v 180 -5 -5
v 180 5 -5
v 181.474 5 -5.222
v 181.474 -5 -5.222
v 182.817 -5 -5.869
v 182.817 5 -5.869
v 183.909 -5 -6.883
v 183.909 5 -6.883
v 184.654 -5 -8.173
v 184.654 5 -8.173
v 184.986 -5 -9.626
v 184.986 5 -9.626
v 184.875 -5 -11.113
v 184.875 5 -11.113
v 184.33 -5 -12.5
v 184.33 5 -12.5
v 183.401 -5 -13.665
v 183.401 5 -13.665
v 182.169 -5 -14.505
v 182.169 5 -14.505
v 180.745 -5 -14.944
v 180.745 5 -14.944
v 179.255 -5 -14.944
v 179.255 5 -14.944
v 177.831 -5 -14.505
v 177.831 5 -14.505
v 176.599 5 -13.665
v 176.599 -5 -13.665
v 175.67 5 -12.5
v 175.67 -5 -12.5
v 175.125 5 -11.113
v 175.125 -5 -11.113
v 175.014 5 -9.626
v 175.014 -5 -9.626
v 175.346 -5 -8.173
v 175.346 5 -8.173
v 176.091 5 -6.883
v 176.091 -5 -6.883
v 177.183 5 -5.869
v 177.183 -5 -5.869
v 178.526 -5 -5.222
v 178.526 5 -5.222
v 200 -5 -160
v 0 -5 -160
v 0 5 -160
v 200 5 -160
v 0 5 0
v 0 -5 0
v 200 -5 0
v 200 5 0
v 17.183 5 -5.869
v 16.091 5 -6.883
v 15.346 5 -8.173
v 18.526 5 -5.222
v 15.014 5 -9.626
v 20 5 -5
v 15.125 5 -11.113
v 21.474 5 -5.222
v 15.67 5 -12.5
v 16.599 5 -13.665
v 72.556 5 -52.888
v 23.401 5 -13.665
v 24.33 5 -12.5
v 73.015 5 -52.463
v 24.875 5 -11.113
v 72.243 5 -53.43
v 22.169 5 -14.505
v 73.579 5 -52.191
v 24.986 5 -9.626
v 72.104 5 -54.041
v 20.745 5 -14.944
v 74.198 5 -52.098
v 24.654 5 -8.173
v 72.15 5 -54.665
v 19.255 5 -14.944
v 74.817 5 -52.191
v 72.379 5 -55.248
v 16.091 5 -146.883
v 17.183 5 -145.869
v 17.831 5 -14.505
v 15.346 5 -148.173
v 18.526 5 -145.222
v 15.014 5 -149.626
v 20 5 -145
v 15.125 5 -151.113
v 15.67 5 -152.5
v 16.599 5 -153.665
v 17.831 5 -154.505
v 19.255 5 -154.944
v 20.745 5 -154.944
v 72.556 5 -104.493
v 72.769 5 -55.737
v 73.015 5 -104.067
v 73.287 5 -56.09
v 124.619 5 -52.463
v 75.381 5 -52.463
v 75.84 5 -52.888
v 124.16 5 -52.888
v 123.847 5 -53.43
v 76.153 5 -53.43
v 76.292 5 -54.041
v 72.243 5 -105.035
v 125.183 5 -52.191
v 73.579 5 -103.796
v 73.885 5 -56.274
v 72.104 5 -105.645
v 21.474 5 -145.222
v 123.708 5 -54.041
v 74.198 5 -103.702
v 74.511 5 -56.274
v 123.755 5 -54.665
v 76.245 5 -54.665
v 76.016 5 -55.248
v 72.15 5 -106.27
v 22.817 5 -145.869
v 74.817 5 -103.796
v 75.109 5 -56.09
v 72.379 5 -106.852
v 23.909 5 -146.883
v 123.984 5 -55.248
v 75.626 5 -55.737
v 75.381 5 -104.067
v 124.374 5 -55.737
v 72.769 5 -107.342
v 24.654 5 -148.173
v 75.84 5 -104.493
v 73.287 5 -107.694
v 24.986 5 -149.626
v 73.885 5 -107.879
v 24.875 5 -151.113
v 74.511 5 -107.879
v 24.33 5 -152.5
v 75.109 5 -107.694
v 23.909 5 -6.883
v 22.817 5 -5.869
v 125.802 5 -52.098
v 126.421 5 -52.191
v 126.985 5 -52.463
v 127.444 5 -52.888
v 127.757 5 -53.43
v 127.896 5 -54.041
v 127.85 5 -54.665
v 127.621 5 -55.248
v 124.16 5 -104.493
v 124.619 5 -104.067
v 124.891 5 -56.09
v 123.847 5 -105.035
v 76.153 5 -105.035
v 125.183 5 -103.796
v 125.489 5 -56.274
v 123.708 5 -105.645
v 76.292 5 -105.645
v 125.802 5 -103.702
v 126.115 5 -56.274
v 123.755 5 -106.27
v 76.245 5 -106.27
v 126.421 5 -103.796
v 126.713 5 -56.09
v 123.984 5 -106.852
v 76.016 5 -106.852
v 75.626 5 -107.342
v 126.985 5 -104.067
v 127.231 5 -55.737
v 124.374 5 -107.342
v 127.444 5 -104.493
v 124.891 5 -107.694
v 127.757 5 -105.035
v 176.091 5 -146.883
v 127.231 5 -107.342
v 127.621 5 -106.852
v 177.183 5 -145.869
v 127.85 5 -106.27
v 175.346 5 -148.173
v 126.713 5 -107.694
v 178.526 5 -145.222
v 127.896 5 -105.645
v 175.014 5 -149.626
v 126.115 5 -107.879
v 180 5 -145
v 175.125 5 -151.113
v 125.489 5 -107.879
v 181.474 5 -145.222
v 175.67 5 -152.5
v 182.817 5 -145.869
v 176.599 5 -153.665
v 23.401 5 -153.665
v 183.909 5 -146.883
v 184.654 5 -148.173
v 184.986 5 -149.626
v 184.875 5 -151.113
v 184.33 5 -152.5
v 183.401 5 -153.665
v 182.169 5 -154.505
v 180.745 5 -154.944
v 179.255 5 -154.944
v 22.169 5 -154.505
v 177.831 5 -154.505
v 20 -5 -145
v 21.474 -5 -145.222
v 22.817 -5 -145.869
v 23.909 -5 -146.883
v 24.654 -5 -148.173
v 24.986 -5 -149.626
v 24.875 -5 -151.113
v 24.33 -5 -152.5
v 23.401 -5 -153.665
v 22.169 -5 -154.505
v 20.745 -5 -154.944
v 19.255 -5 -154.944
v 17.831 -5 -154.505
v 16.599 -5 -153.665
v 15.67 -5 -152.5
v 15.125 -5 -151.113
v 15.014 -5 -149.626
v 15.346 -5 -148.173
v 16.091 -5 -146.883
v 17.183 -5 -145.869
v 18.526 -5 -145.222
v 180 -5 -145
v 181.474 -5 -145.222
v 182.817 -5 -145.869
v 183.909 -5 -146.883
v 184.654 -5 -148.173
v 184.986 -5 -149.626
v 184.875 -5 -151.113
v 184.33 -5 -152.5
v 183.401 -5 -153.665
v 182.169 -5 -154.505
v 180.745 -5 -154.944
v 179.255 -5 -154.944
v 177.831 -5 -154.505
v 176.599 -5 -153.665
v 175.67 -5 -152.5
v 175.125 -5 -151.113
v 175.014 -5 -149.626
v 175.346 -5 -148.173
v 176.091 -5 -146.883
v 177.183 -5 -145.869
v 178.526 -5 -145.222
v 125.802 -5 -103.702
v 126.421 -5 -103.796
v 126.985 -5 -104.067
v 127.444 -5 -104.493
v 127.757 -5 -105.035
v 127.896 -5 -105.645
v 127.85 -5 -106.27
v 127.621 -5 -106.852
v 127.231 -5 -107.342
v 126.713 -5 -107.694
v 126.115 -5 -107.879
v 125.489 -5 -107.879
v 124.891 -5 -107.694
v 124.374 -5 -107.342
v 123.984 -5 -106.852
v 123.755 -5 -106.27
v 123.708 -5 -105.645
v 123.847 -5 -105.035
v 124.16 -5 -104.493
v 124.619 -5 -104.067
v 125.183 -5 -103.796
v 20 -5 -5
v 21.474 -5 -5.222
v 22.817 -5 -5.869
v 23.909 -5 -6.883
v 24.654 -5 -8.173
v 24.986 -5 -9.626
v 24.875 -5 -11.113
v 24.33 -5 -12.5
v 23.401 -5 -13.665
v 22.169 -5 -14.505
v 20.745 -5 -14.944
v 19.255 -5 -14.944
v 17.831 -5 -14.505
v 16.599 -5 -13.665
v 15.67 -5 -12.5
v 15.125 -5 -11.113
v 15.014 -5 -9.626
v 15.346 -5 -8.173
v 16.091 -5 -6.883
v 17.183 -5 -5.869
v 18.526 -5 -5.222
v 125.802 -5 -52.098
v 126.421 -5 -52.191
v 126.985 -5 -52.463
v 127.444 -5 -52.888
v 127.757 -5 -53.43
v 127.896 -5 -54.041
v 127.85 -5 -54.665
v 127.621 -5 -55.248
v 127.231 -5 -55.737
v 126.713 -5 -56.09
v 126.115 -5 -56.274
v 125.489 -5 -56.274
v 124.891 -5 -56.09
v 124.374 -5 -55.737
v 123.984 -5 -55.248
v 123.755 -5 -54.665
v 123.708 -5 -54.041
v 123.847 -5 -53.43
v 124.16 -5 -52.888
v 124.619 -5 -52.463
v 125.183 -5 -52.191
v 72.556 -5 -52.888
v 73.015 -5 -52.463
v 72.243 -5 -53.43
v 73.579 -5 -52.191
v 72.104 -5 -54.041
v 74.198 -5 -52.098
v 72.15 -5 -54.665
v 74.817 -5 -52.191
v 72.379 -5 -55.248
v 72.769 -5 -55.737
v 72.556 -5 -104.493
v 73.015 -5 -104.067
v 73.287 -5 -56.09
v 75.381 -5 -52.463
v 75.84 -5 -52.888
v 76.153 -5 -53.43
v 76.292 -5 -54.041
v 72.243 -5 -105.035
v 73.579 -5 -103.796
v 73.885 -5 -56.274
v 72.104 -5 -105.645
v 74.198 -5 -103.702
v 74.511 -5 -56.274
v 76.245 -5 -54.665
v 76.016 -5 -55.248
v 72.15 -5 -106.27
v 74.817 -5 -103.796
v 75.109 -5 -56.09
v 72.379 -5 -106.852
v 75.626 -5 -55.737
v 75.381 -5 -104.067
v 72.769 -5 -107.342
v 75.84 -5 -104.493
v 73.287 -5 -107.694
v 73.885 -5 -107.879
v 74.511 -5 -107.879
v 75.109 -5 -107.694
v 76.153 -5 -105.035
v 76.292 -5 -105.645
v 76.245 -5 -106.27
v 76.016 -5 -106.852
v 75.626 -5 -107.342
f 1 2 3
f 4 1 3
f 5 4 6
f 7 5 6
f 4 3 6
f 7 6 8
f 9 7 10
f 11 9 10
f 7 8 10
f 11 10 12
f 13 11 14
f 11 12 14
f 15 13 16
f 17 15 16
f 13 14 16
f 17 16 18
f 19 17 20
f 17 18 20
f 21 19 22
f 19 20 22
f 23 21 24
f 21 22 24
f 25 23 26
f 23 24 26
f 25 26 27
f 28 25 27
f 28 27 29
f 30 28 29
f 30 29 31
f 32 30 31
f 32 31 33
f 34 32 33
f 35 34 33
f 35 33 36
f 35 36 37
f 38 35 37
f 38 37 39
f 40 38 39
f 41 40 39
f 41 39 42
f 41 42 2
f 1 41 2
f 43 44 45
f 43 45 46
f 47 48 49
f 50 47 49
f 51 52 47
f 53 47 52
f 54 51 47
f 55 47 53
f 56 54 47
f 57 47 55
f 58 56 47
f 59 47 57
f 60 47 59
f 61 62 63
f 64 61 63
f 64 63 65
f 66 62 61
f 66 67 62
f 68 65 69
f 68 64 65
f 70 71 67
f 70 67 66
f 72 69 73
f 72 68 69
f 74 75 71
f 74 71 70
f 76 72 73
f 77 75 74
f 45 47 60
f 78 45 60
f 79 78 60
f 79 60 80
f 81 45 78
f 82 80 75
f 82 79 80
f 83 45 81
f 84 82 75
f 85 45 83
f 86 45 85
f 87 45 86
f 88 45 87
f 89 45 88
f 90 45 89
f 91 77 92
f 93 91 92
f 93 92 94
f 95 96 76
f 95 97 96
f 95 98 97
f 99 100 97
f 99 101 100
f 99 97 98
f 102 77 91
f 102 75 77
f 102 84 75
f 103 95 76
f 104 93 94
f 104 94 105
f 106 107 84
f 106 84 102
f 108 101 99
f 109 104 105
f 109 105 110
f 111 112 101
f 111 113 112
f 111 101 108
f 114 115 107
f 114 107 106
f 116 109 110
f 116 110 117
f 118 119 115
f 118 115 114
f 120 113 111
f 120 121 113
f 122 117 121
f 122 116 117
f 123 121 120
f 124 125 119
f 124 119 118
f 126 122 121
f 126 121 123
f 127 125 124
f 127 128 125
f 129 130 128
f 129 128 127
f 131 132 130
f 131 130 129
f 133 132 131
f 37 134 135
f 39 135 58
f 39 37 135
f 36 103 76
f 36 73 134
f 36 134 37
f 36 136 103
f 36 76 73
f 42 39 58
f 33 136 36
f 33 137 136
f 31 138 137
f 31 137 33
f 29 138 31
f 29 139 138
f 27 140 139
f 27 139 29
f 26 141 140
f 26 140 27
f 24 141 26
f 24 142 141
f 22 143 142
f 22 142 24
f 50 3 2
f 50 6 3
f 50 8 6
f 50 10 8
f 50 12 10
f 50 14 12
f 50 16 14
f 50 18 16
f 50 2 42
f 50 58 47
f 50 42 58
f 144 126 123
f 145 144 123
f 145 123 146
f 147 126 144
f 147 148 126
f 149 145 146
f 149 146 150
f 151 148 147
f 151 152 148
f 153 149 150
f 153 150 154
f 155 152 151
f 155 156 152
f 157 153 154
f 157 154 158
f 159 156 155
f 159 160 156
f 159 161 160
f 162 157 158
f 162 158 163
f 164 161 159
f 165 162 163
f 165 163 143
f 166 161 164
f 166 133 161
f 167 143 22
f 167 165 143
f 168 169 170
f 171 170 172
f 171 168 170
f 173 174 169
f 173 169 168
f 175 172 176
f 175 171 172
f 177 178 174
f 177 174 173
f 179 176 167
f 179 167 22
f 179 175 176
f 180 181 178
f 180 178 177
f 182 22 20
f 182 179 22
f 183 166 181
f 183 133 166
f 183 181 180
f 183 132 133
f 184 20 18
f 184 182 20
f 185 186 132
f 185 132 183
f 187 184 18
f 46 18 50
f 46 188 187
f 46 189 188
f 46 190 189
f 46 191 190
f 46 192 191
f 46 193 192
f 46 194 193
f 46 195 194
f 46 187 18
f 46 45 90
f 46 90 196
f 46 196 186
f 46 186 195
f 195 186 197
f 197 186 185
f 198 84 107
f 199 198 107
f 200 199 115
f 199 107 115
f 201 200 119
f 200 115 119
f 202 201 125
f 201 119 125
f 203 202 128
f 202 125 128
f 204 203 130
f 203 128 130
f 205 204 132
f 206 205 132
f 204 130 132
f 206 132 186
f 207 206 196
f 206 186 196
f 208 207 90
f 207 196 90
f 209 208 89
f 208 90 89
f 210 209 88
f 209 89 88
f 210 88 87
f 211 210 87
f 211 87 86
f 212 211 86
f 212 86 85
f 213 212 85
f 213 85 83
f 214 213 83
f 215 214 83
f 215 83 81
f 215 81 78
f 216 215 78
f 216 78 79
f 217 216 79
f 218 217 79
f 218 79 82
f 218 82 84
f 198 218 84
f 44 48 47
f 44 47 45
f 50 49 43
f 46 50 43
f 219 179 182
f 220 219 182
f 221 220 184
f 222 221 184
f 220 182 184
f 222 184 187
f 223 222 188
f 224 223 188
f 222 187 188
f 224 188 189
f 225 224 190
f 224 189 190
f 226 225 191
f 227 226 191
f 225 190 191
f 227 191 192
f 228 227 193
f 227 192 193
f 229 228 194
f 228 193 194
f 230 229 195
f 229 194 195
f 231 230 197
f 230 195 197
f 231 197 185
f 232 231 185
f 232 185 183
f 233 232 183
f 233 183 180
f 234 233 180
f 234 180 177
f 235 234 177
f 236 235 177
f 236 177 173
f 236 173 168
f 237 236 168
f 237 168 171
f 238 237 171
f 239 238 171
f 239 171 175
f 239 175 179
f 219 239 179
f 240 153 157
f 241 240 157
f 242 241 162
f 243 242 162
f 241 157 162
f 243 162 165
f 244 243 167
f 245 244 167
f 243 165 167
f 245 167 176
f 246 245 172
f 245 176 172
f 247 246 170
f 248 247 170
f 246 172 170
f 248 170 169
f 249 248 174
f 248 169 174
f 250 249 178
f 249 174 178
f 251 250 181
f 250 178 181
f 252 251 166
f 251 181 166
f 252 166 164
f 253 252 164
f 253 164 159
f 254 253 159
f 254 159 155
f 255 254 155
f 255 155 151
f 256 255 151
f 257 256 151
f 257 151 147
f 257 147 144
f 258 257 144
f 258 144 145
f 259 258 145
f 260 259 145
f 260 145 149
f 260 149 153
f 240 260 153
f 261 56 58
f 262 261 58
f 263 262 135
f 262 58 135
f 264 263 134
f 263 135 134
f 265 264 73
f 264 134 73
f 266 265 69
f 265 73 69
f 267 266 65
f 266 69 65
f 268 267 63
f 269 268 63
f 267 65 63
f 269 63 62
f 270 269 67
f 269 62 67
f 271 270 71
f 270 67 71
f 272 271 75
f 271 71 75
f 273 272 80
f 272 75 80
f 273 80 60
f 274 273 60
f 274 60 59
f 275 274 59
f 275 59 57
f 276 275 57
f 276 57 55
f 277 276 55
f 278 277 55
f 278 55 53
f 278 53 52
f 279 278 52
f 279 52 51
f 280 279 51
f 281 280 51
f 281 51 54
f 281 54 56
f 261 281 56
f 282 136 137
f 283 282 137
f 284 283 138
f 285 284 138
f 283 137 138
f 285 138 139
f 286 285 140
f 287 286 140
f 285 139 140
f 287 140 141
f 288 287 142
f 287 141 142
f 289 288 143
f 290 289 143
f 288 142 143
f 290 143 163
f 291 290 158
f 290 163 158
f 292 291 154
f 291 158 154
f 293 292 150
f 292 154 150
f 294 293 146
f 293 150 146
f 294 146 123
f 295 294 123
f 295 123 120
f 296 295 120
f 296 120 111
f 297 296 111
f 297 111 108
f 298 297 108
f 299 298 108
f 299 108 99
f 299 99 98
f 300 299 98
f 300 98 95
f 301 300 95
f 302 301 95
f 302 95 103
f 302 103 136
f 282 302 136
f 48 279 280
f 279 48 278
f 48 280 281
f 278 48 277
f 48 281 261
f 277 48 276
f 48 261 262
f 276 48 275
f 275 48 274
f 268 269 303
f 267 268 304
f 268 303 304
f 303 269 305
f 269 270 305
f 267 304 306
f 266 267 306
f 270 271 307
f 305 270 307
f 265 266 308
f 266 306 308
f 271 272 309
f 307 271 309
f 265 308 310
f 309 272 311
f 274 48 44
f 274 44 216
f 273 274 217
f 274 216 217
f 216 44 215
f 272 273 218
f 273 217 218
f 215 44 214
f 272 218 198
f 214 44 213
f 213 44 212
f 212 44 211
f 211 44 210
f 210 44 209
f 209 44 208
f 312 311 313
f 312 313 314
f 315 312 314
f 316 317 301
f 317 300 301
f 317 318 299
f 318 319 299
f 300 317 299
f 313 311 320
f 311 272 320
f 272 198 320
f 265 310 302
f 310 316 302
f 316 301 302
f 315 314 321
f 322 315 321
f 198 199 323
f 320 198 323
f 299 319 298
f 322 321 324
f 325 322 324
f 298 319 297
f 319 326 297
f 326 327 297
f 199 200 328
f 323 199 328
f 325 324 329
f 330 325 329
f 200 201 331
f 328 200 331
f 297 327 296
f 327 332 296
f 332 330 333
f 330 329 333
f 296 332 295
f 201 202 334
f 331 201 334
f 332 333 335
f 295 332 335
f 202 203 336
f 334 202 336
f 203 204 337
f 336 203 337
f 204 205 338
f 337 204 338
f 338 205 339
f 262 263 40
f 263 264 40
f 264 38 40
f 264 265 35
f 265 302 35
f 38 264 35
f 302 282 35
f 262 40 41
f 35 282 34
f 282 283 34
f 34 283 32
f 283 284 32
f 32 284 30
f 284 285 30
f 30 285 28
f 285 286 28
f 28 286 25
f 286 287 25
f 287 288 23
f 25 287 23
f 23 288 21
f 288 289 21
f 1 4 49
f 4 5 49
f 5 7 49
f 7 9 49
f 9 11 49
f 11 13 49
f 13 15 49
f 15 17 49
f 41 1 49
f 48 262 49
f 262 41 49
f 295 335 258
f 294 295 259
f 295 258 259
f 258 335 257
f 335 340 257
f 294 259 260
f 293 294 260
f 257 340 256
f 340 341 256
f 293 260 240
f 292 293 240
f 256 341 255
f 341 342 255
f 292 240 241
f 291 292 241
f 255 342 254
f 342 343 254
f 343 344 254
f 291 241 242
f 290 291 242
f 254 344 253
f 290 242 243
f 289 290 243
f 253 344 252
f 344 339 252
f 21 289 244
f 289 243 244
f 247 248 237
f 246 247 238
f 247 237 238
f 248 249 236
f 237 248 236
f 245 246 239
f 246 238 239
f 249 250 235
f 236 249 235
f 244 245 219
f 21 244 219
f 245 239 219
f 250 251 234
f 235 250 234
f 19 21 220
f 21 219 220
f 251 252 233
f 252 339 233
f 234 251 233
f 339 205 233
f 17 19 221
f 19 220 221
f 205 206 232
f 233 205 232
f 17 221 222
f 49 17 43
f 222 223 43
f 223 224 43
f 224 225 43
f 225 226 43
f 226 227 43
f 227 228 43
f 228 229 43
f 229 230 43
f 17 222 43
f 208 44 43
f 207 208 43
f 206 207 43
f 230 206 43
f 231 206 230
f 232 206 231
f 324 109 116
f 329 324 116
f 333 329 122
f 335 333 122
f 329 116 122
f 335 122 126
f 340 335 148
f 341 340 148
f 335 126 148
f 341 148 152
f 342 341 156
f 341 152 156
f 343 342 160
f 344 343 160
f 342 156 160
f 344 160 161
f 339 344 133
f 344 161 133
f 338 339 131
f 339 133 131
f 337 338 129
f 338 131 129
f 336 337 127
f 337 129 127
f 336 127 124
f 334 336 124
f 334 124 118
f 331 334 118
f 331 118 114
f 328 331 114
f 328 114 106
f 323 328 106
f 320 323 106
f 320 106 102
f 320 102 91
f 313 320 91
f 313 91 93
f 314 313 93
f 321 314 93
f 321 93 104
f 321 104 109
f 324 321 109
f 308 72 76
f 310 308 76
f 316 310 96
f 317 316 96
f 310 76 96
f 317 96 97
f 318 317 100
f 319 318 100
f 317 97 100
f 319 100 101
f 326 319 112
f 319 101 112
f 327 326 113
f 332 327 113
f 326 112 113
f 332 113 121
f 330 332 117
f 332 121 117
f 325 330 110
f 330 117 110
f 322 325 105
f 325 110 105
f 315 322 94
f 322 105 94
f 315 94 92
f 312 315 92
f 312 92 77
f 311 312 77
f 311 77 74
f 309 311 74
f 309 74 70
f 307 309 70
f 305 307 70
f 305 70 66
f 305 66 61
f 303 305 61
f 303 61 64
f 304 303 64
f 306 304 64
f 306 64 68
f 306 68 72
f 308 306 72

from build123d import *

# Parameters (mm, degrees)
BOSS_EXTRUDE1_DEPTH      = 5
BOSS_EXTRUDE1_DEPTH_BACK = 5
SKETCH1_W                = 200
SKETCH1_H                = 160
SKETCH2_R                = 5
SKETCH2_R_2              = 2.1
CUT_EXTRUDE1_DEPTH       = 257.32011236


with BuildPart() as part:
    # Sketch1 → Boss-Extrude1 (new, two sides: drawn at the far end of the back side and taken through both)
    with BuildSketch(Plane(origin=(0, 0, 0), x_dir=(1, 0, 0), z_dir=(0, 1, 0)).offset(-BOSS_EXTRUDE1_DEPTH_BACK)):
        with Locations((100, 80)):
            Rectangle(SKETCH1_W, SKETCH1_H)
    extrude(amount=BOSS_EXTRUDE1_DEPTH + BOSS_EXTRUDE1_DEPTH_BACK)

    # Sketch2 → Cut-Extrude1 (cut, through all)
    with BuildSketch(Plane(origin=(0, 5, 0), x_dir=(1, 0, 0), z_dir=(0, 1, 0))):
        with Locations((180, 150)):
            Circle(SKETCH2_R)
        with Locations((74.197673555, 105.802326445)):
            Circle(SKETCH2_R_2)
        with Locations((74.197673555, 54.197673555)):
            Circle(SKETCH2_R_2)
        with Locations((125.802326445, 54.197673555)):
            Circle(SKETCH2_R_2)
        with Locations((125.802326445, 105.802326445)):
            Circle(SKETCH2_R_2)
        with Locations((180, 10)):
            Circle(SKETCH2_R)
        with Locations((20, 10)):
            Circle(SKETCH2_R)
        with Locations((20, 150)):
            Circle(SKETCH2_R)
    extrude(amount=-CUT_EXTRUDE1_DEPTH, mode=Mode.SUBTRACT)


solid = part.part
